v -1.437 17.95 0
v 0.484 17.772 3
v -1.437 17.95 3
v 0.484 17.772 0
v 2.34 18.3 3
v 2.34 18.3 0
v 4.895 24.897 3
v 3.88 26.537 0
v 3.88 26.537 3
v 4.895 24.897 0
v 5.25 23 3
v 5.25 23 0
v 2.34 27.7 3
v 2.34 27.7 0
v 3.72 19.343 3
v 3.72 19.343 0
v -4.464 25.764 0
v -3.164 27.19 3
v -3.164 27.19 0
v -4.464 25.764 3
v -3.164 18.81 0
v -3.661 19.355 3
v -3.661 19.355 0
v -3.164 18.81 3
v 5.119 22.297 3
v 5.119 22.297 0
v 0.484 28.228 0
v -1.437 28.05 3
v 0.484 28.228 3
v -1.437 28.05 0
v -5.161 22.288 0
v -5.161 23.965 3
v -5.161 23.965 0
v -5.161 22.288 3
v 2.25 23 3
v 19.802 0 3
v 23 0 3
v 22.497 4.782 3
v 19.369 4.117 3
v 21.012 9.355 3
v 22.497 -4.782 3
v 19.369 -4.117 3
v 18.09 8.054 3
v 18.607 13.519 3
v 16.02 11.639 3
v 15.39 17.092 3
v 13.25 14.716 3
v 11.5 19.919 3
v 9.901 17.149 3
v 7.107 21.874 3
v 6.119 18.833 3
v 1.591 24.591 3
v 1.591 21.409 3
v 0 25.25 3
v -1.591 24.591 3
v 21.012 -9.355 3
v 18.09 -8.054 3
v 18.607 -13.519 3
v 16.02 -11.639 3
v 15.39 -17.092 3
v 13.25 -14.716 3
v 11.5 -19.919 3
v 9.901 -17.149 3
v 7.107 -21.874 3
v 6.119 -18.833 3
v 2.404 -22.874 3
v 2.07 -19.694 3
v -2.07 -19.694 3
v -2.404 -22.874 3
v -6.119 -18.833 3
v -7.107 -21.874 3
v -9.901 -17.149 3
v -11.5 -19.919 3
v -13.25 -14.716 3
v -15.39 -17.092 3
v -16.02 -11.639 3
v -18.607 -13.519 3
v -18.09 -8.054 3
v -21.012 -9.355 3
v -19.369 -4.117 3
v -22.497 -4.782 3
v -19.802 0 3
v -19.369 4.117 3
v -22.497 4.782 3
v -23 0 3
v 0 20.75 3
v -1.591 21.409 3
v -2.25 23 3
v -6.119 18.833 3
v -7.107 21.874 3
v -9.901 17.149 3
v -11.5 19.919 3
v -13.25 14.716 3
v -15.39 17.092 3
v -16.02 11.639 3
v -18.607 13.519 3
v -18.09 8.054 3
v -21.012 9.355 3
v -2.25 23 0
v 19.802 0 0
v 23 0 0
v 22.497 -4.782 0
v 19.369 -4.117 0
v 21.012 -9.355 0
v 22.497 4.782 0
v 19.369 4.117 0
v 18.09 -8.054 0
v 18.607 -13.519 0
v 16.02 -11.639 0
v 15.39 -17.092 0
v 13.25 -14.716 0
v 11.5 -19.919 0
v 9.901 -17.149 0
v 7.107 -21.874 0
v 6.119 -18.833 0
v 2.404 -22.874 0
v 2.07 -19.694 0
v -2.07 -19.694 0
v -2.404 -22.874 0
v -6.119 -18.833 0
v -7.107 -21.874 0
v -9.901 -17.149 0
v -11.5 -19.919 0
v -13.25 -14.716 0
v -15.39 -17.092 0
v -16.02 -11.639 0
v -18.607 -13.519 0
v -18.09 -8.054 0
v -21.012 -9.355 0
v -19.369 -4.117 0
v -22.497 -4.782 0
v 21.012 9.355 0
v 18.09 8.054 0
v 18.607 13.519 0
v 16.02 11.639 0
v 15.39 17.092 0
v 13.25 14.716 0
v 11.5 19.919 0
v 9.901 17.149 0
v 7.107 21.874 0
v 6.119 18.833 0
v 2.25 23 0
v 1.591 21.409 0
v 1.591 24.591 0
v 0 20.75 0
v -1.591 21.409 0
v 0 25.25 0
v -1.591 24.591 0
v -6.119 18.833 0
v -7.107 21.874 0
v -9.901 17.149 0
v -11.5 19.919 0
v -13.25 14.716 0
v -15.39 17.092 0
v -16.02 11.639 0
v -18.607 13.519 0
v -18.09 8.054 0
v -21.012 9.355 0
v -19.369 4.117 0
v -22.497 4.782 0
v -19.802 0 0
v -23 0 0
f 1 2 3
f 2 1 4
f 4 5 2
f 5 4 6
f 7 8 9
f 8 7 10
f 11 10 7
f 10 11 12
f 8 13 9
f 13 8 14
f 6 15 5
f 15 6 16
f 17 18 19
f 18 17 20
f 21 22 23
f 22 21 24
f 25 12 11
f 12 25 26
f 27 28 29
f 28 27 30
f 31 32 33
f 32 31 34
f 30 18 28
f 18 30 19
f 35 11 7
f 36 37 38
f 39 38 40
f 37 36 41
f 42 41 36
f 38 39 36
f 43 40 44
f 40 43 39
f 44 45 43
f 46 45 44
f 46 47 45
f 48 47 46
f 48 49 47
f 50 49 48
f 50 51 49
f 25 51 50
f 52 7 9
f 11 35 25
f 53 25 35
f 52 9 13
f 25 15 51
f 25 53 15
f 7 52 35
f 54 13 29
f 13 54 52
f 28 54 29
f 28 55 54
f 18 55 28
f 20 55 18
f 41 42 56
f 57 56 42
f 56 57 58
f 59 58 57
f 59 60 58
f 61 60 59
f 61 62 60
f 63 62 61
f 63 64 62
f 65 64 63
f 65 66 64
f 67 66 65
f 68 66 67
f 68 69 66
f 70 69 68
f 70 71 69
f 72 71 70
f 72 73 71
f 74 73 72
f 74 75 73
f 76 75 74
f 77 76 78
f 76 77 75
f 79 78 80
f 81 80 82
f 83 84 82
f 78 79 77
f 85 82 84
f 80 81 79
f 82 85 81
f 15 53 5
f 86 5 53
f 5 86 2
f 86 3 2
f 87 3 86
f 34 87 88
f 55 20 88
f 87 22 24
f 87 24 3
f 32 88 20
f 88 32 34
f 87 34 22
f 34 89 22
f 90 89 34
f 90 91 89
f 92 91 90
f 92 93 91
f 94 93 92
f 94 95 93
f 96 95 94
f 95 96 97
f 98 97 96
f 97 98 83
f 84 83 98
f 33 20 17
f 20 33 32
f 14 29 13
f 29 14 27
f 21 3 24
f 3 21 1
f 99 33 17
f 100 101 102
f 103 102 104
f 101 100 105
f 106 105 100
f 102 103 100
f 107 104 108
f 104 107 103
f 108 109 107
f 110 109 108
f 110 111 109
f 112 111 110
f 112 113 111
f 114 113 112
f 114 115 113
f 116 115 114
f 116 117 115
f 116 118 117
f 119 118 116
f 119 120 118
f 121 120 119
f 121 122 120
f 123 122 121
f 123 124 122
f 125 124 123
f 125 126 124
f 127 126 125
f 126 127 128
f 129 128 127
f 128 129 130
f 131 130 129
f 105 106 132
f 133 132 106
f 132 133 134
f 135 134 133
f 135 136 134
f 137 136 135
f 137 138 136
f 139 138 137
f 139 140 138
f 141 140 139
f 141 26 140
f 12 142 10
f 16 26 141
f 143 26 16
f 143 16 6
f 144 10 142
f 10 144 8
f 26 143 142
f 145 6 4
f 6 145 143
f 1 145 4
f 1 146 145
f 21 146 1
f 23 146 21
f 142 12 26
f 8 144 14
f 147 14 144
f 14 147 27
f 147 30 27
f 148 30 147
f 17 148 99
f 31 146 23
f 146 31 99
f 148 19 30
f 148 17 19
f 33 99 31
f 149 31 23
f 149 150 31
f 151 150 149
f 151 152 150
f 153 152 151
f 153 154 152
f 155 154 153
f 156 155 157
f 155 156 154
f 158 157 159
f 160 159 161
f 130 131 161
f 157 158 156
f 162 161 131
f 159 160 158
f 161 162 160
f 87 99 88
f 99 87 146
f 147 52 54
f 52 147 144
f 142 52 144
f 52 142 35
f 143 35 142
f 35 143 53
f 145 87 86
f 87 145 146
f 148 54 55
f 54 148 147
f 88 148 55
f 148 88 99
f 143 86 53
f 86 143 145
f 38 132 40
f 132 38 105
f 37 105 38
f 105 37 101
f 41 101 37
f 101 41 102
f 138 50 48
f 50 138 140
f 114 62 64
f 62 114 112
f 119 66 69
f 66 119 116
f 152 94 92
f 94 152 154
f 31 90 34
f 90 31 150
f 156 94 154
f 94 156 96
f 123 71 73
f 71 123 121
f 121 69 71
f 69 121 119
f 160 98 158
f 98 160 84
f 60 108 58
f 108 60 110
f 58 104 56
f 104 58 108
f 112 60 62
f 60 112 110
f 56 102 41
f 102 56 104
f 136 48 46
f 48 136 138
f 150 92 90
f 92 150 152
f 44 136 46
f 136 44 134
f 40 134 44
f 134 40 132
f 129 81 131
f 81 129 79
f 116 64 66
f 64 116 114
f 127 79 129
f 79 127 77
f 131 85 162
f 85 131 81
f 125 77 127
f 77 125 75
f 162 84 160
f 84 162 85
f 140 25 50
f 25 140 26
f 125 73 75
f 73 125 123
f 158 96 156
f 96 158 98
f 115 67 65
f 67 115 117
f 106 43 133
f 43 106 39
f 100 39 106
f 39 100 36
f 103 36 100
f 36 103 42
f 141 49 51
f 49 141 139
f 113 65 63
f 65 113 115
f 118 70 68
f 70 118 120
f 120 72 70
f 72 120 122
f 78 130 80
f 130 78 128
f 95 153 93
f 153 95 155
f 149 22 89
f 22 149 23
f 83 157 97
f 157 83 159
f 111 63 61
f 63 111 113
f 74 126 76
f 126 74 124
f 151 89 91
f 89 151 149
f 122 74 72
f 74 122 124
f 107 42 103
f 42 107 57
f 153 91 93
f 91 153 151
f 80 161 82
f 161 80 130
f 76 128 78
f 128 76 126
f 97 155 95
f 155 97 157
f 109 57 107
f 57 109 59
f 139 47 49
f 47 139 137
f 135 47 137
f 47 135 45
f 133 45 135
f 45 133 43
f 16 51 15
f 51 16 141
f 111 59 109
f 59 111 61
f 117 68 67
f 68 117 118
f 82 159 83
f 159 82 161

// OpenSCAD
//keychain-Customizable Lithopane by Mark G. Peeters 
//http://www.thingiverse.com/thing:308109
//version 1.3 
//if you are using openSCAD then you are cool! You can get DAT files for local use using this tool
//http://customizer.makerbot.com/image_surface
// i used the nice code for adjusting layers from here:
//http://www.thingiverse.com/thing:74322

// preview[view:south, tilt:top]
//
//
/* [Image] */

// Load a 100x100 pixel image.(images will be stretched to fit) Simple photos work best. Don't forget to click the Invert Colors checkbox! *** ALSO IF YOU HAVE LETTERS IN YOUR IMAGE make sure to reverse the image before uploading so the letters are not backwards.
image_file = "image-surface.dat"; // [image_surface:100x100]

/* [Adjustments] */

//shape NOTE: ALL units are in millimeters (mm)
shape = 0;//[0:circle, 1:square]
//over all size of the keychain. you picked
tag_size = 40;// [20:70]
// size for keyring 4.5 or 5 is good.
ring_hole=4.5;
// What layer height will you slice this at?  The thinner the better.
layer_height = 0.1;
//Use plastic color opacity to set this. The lower the layer height, the more layers you can use. you picked
number_of_layers = 12; // [5:30]
//Width of boarder lining the keychain (3mm is fine)
boarder_width = 3;//
//boarder thickness lining the keychain (at least 3mm for strength)
boarder_thick = 3;//

/* [Hidden] */

// base (white) will always be 2 layers thick
min_layer_height = layer_height*2;
height = layer_height*number_of_layers;
maxheight = height+min_layer_height;


// Make litho and trim bottom and sides
  difference() { //diff 1
  translate([0, 0, min_layer_height]) scale([(tag_size/100),(tag_size/100),height]) surface(file=image_file, center=true, convexity=5); //litosurface moved up min_layer_height
  translate([0,0,-(maxheight)]) linear_extrude(height=maxheight) square(tag_size, center=true);//cutting bottom off surface

if (shape==0) {//you picked circle shape------------------------------------
difference() {  //diff make tube to trim lith
                translate([0, 0, -7]) cylinder(maxheight+15,r= tag_size); //outside
                translate([0, 0, -9]) cylinder(maxheight+18,r= (tag_size/2)); //inside
               } //end diff make tube
translate([0, tag_size/2+boarder_width, -1])cylinder(maxheight+2,r= ring_hole/2); //ring hole
}//end if you picked circle------------------------------------------

if (shape==1) {//you picked square shape------------------------------------
difference() {  //diff make cube to trim litho
                translate([0, 0, -7]) cube(tag_size+15,center=true); //outside
               translate([0, 0, -9]) cube(tag_size,center=true); //inside
               } //end diff make tube
translate([tag_size/2, tag_size/2, -1])cylinder(maxheight+2,r= ring_hole/2); //ring hole
}//end if you picked square

}//end diff 1

//add boarder and loop
if (shape==0) {//you picked circle shape--------------------------
translate([0, tag_size/2+boarder_width, 0]) //move loop
difference(){//make loop
cylinder(boarder_thick,r=boarder_width+ring_hole/2); //ring support
translate([0, 0, -1])cylinder(boarder_thick+2,r= ring_hole/2); //ring hole
}

difference() {  //diff make frame tube
                 cylinder(boarder_thick,r= (tag_size/2)+boarder_width); //outside
                 cylinder(boarder_thick+1,r= (tag_size/2.02)); //inside
translate([0, tag_size/2+boarder_width, -1])cylinder(boarder_thick+2,r= ring_hole/2); //ring hole
                } //end diff make frame tube

}//end if you picked circle------------------------------------------

if (shape==1) {//you picked square shape------------------------------------
translate([tag_size/2, tag_size/2, 0]) //move loop
difference(){//make loop
cylinder(boarder_thick,r=boarder_width+ring_hole/2); //ring support
translate([0, 0, -1])cylinder(boarder_thick+2,r= ring_hole/2); //ring hole
}

difference() {  //diff make frame tube
                 translate([0,0,boarder_thick/2]) cube([tag_size+boarder_width*2,tag_size+boarder_width*2,boarder_thick],center=true); //outside
                 translate([0,0,boarder_thick/2]) cube([tag_size-1,tag_size-1,boarder_thick+1],center=true); //inside
translate([tag_size/2, tag_size/2, -1])cylinder(boarder_thick+2,r= ring_hole/2); //ring hole                
                        } //end diff make frame tube
}//end if you picked square------------------------------------------------





